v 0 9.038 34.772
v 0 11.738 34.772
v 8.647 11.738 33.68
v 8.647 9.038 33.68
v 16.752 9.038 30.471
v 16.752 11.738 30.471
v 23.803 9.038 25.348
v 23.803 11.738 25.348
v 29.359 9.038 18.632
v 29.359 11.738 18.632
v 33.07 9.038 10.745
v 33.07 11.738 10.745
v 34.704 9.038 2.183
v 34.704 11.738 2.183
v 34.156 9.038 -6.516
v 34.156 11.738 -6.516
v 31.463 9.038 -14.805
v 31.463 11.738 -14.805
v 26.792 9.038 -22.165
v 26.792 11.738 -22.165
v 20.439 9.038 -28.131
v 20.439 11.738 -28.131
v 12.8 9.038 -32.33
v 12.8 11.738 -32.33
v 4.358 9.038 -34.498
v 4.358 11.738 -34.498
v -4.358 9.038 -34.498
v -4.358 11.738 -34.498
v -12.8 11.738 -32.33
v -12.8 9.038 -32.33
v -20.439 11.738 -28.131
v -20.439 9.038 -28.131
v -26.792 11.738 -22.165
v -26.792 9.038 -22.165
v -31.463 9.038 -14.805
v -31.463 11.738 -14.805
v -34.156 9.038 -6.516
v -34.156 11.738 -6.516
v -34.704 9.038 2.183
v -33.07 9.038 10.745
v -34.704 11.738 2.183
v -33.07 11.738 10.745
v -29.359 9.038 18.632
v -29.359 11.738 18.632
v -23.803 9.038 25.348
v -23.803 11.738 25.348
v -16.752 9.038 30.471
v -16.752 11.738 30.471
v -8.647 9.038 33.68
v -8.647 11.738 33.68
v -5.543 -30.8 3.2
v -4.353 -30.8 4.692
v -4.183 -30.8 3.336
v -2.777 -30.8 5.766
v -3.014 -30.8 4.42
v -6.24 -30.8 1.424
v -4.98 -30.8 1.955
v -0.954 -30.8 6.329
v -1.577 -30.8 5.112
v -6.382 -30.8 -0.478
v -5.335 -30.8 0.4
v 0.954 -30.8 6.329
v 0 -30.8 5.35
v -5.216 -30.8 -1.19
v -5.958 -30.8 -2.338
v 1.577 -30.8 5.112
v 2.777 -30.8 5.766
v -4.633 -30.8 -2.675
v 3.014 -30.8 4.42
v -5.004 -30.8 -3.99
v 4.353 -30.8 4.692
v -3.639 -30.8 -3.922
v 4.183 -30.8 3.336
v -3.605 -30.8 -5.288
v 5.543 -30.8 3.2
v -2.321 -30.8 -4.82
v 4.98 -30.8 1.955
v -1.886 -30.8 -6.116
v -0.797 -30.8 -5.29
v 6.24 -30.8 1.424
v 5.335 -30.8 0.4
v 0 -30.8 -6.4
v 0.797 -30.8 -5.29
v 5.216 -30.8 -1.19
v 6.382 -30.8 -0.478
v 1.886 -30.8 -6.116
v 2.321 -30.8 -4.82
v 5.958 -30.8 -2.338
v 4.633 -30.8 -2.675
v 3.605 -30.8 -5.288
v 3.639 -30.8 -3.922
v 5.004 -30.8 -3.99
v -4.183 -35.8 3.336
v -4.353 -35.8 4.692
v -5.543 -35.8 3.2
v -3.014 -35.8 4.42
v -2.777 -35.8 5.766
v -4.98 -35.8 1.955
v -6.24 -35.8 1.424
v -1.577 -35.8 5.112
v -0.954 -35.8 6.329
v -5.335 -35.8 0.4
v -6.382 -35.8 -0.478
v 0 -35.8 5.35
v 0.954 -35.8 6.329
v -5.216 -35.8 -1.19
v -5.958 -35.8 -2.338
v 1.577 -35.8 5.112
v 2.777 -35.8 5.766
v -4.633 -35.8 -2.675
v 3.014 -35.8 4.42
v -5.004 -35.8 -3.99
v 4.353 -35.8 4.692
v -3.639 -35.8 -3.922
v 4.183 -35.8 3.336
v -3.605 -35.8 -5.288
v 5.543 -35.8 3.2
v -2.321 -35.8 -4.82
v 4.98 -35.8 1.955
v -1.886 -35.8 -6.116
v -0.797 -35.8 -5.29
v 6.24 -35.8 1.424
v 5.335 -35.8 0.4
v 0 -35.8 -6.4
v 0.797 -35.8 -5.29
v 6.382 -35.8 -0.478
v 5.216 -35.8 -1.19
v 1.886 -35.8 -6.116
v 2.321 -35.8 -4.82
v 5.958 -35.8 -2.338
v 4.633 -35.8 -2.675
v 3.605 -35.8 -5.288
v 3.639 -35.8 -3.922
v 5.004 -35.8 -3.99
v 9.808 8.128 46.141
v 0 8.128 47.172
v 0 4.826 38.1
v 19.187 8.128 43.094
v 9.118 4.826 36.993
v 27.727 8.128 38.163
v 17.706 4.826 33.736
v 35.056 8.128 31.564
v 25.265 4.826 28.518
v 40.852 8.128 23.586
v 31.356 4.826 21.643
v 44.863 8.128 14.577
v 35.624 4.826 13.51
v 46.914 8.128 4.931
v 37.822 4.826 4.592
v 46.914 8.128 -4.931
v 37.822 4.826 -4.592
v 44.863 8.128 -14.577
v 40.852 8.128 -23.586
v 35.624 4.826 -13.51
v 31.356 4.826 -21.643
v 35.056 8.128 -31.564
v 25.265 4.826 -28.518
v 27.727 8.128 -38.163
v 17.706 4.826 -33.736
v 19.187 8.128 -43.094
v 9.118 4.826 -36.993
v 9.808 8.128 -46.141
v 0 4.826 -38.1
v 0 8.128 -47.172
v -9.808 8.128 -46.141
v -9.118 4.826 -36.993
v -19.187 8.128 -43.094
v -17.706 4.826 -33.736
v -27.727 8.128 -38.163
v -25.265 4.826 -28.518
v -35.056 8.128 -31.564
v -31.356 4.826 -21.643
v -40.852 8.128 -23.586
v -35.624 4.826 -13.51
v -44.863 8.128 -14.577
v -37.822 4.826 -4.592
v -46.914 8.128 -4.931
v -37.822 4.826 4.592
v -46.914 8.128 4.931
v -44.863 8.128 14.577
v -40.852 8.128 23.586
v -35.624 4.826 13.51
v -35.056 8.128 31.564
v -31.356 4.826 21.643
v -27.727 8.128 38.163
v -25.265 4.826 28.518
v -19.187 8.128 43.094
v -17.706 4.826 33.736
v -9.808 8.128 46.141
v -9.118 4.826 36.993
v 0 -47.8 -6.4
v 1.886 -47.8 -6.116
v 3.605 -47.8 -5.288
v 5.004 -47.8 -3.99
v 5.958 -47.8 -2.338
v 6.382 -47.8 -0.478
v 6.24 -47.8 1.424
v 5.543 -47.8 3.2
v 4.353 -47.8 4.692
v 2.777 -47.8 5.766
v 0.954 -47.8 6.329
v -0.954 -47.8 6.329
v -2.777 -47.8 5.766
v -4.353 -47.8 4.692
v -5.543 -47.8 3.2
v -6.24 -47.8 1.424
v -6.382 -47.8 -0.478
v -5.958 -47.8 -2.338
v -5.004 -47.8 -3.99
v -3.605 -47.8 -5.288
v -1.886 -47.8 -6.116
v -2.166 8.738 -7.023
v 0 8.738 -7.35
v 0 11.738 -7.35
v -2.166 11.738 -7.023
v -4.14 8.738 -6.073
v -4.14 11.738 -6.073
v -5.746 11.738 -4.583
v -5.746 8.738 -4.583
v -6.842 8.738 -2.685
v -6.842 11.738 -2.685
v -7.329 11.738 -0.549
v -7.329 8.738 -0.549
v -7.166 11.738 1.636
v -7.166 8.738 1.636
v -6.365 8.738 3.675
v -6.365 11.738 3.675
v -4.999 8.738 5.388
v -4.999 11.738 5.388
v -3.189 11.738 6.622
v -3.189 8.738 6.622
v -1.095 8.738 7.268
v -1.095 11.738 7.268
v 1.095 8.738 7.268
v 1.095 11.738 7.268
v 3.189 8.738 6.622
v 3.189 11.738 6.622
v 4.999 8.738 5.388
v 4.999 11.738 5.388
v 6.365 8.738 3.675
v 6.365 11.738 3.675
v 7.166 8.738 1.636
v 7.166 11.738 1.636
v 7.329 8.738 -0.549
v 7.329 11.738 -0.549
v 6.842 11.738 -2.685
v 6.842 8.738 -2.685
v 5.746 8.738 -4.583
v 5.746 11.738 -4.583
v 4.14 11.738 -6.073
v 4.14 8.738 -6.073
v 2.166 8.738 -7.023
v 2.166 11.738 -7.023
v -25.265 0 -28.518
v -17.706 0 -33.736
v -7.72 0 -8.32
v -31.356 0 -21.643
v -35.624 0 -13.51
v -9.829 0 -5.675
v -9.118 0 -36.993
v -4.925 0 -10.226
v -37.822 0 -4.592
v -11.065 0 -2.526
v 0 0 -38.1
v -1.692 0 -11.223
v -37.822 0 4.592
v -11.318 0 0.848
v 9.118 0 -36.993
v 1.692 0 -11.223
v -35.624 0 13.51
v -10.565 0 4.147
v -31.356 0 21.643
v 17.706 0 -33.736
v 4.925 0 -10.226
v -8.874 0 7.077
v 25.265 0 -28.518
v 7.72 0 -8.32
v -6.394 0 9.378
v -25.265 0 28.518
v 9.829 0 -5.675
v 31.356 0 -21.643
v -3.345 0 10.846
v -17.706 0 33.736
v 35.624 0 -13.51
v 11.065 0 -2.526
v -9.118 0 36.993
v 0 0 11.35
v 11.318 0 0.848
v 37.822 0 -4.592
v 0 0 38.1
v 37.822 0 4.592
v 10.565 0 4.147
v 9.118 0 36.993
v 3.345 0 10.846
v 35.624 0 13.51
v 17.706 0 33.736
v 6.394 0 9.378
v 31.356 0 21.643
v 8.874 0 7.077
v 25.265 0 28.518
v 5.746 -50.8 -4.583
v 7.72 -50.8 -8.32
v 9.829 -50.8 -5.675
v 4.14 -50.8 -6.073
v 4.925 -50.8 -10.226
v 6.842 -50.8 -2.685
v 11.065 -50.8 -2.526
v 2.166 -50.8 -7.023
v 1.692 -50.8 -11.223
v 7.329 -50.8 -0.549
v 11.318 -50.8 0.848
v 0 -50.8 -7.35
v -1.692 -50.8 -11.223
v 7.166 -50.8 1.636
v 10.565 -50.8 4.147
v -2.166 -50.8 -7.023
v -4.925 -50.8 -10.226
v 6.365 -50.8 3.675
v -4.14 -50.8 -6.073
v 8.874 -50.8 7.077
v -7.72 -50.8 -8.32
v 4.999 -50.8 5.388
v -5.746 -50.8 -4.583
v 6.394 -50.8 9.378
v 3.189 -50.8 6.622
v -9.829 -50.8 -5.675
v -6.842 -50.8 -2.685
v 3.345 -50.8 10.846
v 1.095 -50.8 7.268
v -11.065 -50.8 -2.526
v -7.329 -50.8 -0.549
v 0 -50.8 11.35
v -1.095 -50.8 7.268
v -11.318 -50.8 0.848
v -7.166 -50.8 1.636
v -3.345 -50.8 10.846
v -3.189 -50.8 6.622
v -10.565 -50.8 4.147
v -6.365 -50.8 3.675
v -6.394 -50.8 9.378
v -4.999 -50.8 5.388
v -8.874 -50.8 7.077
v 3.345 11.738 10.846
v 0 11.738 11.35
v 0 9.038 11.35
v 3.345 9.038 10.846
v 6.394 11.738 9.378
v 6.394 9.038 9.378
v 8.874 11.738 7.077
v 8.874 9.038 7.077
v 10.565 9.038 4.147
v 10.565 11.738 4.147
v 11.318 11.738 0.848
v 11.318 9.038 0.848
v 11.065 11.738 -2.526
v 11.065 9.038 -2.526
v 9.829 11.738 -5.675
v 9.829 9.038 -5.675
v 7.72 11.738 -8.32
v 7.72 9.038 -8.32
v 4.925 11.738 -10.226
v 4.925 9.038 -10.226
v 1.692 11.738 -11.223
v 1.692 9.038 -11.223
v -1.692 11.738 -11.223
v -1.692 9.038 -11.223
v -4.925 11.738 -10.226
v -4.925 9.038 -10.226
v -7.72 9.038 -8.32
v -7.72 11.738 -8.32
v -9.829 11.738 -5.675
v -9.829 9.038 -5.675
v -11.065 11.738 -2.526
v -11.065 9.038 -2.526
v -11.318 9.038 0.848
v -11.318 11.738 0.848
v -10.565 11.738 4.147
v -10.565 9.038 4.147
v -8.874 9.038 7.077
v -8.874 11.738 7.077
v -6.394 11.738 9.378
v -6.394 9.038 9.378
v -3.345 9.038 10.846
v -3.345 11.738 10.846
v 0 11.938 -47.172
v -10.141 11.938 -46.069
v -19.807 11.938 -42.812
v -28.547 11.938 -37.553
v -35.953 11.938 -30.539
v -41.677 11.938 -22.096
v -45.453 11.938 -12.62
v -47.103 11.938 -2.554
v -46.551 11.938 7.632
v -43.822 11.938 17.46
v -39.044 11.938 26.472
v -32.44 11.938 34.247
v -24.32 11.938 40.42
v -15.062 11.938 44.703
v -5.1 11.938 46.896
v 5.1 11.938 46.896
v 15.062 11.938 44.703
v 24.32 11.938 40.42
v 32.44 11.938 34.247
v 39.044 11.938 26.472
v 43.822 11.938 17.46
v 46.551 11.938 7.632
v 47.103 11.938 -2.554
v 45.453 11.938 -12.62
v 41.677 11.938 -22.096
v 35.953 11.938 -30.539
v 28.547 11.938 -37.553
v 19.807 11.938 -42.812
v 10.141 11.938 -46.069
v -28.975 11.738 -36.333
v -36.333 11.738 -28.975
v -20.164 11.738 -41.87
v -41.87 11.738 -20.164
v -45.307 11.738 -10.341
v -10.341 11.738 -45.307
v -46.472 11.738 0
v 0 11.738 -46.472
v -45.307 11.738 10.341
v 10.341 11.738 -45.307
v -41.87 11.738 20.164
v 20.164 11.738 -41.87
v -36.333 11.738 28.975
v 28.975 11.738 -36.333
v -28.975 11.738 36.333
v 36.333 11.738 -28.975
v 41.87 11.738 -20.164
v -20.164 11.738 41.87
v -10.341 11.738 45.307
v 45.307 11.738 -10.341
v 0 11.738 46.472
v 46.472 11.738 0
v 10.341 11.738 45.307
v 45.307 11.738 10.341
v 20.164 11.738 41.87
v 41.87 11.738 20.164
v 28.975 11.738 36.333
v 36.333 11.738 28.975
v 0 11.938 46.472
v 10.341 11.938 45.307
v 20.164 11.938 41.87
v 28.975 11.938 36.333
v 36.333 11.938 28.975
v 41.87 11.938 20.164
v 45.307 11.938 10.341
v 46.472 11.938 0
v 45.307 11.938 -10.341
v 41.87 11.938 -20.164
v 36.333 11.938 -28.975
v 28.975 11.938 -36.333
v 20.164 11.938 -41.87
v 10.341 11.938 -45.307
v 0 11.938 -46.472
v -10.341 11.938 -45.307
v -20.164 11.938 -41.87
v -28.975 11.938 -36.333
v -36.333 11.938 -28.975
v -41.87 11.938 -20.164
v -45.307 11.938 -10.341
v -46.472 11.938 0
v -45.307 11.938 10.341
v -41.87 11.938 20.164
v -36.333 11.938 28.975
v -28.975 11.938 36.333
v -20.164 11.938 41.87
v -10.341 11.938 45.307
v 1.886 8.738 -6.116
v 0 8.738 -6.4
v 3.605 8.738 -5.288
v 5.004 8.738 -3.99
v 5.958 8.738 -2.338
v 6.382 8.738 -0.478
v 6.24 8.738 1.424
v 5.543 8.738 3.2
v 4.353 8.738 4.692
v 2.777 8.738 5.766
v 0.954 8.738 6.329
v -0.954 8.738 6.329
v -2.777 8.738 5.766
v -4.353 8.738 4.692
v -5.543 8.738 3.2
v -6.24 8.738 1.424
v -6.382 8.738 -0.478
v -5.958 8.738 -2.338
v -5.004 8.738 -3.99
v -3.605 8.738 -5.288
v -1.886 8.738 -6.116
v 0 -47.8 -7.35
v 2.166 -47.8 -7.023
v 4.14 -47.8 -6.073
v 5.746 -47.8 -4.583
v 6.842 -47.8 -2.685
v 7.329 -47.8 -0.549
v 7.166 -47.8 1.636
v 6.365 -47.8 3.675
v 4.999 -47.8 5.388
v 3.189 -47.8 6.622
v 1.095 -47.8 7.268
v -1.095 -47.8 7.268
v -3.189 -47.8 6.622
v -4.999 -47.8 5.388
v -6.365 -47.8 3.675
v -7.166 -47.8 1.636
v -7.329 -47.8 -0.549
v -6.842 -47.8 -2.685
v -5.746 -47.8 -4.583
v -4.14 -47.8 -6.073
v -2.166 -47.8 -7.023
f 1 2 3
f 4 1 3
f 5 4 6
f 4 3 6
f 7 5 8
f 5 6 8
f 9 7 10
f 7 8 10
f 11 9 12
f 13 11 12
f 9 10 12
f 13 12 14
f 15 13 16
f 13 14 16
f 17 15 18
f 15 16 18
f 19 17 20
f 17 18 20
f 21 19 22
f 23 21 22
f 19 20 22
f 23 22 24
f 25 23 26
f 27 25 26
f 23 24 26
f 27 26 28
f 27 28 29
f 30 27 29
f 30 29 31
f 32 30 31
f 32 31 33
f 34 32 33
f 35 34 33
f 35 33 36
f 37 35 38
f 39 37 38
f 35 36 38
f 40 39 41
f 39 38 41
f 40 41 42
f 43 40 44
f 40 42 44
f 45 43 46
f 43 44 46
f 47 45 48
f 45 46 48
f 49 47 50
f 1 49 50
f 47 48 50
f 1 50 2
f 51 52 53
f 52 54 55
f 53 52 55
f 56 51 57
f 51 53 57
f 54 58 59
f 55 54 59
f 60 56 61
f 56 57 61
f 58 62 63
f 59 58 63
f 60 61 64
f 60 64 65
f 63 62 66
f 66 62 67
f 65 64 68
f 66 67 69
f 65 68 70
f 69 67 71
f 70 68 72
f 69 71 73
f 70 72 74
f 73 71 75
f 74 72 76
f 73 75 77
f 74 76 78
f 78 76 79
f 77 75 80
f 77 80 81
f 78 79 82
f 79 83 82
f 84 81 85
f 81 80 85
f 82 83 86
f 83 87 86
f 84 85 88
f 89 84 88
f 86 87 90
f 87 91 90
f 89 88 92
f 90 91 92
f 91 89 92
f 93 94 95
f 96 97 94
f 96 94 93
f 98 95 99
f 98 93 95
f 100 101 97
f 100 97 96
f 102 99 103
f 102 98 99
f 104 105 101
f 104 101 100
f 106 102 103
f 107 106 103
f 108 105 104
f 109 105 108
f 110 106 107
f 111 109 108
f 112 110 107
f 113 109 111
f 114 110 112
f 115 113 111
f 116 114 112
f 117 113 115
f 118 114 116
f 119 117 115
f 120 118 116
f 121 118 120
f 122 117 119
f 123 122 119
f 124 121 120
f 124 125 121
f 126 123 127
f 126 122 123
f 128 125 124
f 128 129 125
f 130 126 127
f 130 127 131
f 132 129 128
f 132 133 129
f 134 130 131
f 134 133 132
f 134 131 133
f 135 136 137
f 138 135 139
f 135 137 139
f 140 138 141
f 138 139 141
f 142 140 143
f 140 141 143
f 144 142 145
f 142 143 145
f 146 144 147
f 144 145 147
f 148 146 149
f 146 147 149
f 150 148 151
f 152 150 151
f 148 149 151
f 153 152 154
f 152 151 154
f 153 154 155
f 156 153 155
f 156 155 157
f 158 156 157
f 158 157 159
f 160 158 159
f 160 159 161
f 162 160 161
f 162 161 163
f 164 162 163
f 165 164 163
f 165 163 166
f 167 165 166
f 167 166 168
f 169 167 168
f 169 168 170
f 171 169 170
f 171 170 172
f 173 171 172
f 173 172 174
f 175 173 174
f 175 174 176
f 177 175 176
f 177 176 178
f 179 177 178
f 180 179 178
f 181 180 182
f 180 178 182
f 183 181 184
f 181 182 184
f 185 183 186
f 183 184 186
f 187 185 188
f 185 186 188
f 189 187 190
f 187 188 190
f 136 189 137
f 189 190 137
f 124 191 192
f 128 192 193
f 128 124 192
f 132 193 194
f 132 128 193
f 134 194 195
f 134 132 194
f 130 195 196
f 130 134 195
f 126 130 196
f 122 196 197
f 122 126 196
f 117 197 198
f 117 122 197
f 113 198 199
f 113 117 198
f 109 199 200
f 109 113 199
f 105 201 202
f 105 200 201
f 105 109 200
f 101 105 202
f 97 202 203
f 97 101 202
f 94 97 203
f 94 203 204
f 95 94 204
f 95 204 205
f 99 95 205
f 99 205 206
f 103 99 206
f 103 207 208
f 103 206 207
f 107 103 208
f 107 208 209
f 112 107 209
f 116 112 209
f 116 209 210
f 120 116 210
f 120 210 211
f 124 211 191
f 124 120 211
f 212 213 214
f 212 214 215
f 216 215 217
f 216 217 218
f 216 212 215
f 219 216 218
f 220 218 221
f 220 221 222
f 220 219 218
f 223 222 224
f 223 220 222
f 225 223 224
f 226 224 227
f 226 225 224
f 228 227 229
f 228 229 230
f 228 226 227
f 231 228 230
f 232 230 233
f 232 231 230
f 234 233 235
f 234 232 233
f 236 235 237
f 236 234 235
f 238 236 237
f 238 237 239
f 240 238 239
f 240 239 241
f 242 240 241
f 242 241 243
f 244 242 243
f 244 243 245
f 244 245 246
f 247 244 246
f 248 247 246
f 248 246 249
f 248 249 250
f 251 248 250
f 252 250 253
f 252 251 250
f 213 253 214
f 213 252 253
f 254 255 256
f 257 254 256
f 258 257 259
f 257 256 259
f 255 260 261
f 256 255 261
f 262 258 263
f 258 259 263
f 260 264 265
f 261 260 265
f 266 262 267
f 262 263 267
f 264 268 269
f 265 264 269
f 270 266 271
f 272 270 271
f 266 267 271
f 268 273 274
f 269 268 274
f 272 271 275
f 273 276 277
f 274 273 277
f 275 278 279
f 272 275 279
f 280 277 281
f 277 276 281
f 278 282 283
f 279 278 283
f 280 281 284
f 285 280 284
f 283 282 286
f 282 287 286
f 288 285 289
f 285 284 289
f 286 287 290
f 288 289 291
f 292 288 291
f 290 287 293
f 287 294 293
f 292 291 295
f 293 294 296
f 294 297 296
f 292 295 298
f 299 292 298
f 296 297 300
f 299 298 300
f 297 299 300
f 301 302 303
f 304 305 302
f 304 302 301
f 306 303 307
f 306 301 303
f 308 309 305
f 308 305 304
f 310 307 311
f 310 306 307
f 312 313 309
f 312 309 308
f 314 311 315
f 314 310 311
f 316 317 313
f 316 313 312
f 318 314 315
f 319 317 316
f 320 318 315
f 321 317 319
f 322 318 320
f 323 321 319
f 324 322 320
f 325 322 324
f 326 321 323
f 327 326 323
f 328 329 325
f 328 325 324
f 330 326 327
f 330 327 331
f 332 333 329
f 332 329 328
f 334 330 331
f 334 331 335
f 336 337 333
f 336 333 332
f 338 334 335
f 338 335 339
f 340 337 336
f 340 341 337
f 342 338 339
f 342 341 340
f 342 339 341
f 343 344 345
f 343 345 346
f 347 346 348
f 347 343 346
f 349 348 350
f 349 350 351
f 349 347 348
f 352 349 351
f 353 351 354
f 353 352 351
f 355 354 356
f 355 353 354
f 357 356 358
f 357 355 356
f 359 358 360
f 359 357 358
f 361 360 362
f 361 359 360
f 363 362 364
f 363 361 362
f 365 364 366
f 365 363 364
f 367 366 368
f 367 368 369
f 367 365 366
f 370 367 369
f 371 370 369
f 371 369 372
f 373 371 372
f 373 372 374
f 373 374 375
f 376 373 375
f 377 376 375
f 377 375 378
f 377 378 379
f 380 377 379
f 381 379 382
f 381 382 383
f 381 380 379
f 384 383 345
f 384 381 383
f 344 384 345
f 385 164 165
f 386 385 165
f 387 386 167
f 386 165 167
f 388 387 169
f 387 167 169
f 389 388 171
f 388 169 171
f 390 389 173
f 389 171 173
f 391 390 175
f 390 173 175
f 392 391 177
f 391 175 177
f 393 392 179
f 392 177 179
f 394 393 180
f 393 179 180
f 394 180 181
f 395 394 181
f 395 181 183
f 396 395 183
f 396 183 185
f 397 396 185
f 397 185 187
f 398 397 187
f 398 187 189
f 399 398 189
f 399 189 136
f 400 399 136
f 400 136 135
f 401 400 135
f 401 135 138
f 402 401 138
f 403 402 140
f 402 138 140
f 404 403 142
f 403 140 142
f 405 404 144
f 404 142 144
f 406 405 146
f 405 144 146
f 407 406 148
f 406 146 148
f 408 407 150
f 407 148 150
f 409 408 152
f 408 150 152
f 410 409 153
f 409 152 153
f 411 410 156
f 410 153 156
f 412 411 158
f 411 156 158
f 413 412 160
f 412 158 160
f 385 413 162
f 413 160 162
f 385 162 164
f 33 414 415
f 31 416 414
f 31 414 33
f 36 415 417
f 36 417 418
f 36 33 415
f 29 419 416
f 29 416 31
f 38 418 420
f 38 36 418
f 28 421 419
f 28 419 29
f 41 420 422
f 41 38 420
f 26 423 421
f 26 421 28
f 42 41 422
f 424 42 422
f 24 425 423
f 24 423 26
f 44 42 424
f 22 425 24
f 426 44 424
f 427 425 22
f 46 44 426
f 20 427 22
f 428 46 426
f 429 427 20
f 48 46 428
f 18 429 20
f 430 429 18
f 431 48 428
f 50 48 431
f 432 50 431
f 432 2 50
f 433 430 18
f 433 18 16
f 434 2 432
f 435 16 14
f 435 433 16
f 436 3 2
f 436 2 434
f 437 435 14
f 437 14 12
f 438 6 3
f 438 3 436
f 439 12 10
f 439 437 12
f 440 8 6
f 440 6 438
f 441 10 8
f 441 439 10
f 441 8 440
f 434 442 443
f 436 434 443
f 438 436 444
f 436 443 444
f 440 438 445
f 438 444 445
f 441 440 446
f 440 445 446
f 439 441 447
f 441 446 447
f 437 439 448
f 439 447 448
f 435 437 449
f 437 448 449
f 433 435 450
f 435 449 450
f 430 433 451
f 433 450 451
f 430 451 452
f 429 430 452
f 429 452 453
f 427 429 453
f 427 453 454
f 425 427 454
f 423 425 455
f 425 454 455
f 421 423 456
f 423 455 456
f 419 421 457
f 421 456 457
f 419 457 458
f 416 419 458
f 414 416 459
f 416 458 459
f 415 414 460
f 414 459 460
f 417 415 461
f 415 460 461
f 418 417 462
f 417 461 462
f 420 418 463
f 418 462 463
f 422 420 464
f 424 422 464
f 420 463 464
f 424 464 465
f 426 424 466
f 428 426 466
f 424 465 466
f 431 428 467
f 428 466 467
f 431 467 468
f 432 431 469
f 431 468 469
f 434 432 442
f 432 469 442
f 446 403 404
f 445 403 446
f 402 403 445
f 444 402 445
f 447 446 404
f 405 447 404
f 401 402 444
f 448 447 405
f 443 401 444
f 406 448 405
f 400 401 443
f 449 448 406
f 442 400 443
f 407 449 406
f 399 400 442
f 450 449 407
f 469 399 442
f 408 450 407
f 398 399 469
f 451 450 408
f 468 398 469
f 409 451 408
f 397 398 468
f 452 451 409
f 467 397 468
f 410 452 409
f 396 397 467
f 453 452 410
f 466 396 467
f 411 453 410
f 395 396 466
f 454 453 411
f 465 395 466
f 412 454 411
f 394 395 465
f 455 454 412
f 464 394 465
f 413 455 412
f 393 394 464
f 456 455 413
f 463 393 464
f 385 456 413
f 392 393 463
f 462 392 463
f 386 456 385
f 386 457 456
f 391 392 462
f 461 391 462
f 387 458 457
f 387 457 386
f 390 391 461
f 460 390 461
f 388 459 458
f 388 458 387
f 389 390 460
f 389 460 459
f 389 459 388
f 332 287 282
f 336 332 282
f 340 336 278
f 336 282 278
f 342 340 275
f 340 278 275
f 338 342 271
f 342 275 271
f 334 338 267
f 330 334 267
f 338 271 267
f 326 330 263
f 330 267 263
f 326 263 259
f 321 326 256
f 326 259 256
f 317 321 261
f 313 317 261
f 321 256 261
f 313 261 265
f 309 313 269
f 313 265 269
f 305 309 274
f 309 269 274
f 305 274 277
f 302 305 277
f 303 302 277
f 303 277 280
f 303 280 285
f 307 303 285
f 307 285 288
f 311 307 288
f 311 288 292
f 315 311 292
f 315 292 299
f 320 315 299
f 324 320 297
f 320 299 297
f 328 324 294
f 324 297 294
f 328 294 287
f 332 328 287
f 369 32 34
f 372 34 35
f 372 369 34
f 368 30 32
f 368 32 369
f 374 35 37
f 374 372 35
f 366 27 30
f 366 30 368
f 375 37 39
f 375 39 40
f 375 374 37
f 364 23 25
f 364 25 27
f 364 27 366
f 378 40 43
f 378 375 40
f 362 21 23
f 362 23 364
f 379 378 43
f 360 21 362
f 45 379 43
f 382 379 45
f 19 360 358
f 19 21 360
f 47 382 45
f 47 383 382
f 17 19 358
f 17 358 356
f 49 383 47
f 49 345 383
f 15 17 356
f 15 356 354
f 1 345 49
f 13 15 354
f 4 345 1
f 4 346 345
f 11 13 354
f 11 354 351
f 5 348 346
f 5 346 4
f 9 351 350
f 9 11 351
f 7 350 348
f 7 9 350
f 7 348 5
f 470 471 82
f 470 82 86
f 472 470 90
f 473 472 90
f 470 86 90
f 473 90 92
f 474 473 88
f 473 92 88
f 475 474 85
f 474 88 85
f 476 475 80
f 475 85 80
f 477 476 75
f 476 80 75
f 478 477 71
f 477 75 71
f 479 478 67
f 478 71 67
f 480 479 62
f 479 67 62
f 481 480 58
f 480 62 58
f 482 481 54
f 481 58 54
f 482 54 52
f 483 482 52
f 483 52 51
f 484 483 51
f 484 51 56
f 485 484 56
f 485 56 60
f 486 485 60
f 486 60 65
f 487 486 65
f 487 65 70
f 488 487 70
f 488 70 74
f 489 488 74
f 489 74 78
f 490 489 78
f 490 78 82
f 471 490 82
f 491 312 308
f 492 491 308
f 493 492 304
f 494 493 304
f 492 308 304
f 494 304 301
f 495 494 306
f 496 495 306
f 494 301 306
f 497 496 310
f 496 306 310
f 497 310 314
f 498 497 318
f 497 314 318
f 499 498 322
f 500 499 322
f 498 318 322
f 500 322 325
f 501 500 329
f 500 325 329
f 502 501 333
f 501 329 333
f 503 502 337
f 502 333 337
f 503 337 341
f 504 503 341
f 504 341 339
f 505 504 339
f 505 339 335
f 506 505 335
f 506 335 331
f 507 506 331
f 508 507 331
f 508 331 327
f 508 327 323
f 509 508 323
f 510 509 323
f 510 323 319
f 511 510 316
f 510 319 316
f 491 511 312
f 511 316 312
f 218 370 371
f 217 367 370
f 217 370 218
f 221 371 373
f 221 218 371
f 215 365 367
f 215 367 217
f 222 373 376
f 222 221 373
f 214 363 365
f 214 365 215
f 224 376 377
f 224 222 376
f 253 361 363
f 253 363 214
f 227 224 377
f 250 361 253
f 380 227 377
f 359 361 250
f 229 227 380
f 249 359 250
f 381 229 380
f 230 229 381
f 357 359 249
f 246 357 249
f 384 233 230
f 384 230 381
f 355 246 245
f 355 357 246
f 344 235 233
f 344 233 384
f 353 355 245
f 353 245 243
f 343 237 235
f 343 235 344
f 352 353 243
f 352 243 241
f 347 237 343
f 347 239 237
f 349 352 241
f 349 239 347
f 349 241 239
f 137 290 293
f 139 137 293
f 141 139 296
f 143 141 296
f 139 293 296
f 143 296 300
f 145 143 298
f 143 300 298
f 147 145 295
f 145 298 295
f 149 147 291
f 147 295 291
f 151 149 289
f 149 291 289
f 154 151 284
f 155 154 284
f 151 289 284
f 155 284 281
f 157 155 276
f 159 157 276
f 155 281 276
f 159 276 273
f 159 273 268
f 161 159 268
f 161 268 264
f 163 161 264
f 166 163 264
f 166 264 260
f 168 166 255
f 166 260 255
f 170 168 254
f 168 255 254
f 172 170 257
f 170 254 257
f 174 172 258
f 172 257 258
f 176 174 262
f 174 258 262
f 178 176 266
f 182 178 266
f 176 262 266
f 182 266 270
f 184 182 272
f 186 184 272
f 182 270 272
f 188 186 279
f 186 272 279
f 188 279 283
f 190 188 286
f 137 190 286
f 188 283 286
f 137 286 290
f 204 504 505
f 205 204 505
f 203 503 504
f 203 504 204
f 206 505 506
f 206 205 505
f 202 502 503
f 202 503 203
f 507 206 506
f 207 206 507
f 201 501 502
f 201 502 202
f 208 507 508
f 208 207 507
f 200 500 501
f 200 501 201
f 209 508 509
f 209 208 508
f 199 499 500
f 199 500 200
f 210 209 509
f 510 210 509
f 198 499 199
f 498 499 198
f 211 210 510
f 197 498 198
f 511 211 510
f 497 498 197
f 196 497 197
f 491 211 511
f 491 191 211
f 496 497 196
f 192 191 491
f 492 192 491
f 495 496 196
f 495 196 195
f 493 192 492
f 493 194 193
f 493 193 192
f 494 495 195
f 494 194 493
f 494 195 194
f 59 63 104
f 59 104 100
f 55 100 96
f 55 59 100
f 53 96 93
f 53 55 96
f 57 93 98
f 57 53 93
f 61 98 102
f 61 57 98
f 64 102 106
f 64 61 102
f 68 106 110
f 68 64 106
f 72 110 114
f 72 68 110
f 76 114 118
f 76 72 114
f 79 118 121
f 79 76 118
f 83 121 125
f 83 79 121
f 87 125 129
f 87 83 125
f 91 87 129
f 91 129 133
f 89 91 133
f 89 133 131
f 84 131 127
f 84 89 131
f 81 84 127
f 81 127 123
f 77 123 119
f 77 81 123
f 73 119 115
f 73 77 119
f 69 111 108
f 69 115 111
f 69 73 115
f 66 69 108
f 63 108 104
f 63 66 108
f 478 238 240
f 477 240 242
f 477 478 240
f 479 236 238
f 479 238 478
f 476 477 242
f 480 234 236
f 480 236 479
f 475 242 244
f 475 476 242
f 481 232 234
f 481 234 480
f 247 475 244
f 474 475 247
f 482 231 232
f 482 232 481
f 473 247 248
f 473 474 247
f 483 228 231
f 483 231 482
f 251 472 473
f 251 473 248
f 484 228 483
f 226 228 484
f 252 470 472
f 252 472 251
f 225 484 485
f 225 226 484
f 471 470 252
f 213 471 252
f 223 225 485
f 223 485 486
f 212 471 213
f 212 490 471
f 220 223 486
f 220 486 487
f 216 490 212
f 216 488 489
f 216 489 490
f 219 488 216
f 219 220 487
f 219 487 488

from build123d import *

# Parameters (mm, degrees)
SKETCH1_R           = 38.1
BOSS_EXTRUDE1_DEPTH = 4.826
SKETCH2_R           = 38.1
BOSS_EXTRUDE2_DEPTH = 3.302
BOSS_EXTRUDE2_DRAFT = -70
SKETCH3_R           = 47.172170439
BOSS_EXTRUDE3_DEPTH = 3.81
SKETCH4_R           = 46.472170439
CUT_EXTRUDE1_DEPTH  = 0.2
SKETCH6_R           = 34.772170439
SKETCH6_R_2         = 11.35
CUT_EXTRUDE2_DEPTH  = 2.7
SKETCH7_R           = 5.35
CUT_EXTRUDE3_DEPTH  = 68.736312063
SKETCH8_R           = 11.35
SKETCH8_R_2         = 5.35
BOSS_EXTRUDE4_DEPTH = 50.8
SKETCH9_R           = 7.35
CUT_EXTRUDE4_DEPTH  = 3
CUT_EXTRUDE5_START  = -3
SKETCH10_R          = 7.35
CUT_EXTRUDE5_DEPTH  = 3
SKETCH12_R          = 6.4
CUT_EXTRUDE8_DEPTH  = 83.032578722
SKETCH13_R          = 6.4
CUT_EXTRUDE9_DEPTH  = 80.227293099


with BuildPart() as part:
    # Sketch1 → Boss-Extrude1 (new body)
    with BuildSketch(Plane(origin=(0, 0, 0), x_dir=(1, 0, 0), z_dir=(0, 1, 0))):
        with Locations(Location((0, 0, 0), (0, 0, 270))):
            Circle(SKETCH1_R)
    extrude(amount=BOSS_EXTRUDE1_DEPTH)


with BuildPart() as boss_extrude2_tool:
    # Sketch2 → Boss-Extrude2 (with draft: the straight prism first)
    with BuildSketch(Plane(origin=(0, 4.826, 0), x_dir=(1, 0, 0), z_dir=(0, 1, 0))):
        with Locations(Location((0, 0, 0), (0, 0, 270))):
            Circle(SKETCH2_R)
    extrude(amount=BOSS_EXTRUDE2_DEPTH)
    # Boss-Extrude2: the draft: its side faces are tilted about the plane it starts from
    boss_extrude2_sides = [boss_extrude2_tool.faces().sort_by_distance(p)[0] for p in [
        (0, 6.477, -38.1),
    ]]
    draft(boss_extrude2_sides, Plane(origin=(0, 4.826, 0), x_dir=(1, 0, 0), z_dir=(0, 1, 0)), BOSS_EXTRUDE2_DRAFT)


with BuildPart() as part_1:
    add(part.part)

    # Boss-Extrude2: add boss_extrude2_tool
    add(boss_extrude2_tool.part)

    # Sketch3 → Boss-Extrude3 (add)
    with BuildSketch(Plane(origin=(0, 8.128, 0), x_dir=(1, 0, 0), z_dir=(0, 1, 0))):
        with Locations(Location((0, 0, 0), (0, 0, 90))):
            Circle(SKETCH3_R)
    extrude(amount=BOSS_EXTRUDE3_DEPTH)

    # Sketch4 → Cut-Extrude1 (cut)
    with BuildSketch(Plane(origin=(0, 11.938, 0), x_dir=(1, 0, 0), z_dir=(0, 1, 0))):
        with Locations(Location((0, 0, 0), (0, 0, 270))):
            Circle(SKETCH4_R)
    extrude(amount=-CUT_EXTRUDE1_DEPTH, mode=Mode.SUBTRACT)

    # Sketch6 → Cut-Extrude2 (cut)
    with BuildSketch(Plane(origin=(0, 11.738, 0), x_dir=(1, 0, 0), z_dir=(0, 1, 0))):
        with Locations(Location((0, 0, 0), (0, 0, 270))):
            Circle(SKETCH6_R)
        with Locations(Location((0, 0, 0), (0, 0, 270))):
            Circle(SKETCH6_R_2, mode=Mode.SUBTRACT)
    extrude(amount=-CUT_EXTRUDE2_DEPTH, mode=Mode.SUBTRACT)

    # Sketch7 → Cut-Extrude3 (cut, through all)
    with BuildSketch(Plane(origin=(0, 11.738, 0), x_dir=(1, 0, 0), z_dir=(0, 1, 0))):
        with Locations(Location((0, 0, 0), (0, 0, 270))):
            Circle(SKETCH7_R)
    extrude(amount=-CUT_EXTRUDE3_DEPTH, mode=Mode.SUBTRACT)

    # Sketch8 → Boss-Extrude4 (add)
    with BuildSketch(Plane.XZ):
        with Locations(Location((0, 0, 0), (0, 0, 90))):
            Circle(SKETCH8_R)
        with Locations(Location((0, 0, 0), (0, 0, 90))):
            Circle(SKETCH8_R_2, mode=Mode.SUBTRACT)
    extrude(amount=BOSS_EXTRUDE4_DEPTH)

    # Sketch9 → Cut-Extrude4 (cut)
    with BuildSketch(Plane.XZ.offset(50.8)):
        with Locations(Location((0, 0, 0), (0, 0, 270))):
            Circle(SKETCH9_R)
    extrude(amount=-CUT_EXTRUDE4_DEPTH, mode=Mode.SUBTRACT)

    # Sketch10 → Cut-Extrude5 (cut)
    with BuildSketch(Plane(origin=(0, 11.738, 0), x_dir=(1, 0, 0), z_dir=(0, 1, 0)).offset(CUT_EXTRUDE5_START)):
        with Locations(Location((0, 0, 0), (0, 0, 90))):
            Circle(SKETCH10_R)
    extrude(amount=CUT_EXTRUDE5_DEPTH, mode=Mode.SUBTRACT)

    # Sketch12 → Cut-Extrude8 (cut, through all)
    with BuildSketch(Plane(origin=(0, -35.8, 0), x_dir=(-1, 0, 0), z_dir=(0, -1, 0))):
        with Locations(Location((0, 0, 0), (0, 0, 90))):
            Circle(SKETCH12_R)
    extrude(amount=CUT_EXTRUDE8_DEPTH, mode=Mode.SUBTRACT)

    # Sketch13 → Cut-Extrude9 (cut, through all)
    with BuildSketch(Plane(origin=(0, -30.8, 0), x_dir=(-1, 0, 0), z_dir=(0, -1, 0))):
        with Locations(Location((0, 0, 0), (0, 0, 90))):
            Circle(SKETCH13_R)
    extrude(amount=-CUT_EXTRUDE9_DEPTH, mode=Mode.SUBTRACT)


solid = part_1.part
